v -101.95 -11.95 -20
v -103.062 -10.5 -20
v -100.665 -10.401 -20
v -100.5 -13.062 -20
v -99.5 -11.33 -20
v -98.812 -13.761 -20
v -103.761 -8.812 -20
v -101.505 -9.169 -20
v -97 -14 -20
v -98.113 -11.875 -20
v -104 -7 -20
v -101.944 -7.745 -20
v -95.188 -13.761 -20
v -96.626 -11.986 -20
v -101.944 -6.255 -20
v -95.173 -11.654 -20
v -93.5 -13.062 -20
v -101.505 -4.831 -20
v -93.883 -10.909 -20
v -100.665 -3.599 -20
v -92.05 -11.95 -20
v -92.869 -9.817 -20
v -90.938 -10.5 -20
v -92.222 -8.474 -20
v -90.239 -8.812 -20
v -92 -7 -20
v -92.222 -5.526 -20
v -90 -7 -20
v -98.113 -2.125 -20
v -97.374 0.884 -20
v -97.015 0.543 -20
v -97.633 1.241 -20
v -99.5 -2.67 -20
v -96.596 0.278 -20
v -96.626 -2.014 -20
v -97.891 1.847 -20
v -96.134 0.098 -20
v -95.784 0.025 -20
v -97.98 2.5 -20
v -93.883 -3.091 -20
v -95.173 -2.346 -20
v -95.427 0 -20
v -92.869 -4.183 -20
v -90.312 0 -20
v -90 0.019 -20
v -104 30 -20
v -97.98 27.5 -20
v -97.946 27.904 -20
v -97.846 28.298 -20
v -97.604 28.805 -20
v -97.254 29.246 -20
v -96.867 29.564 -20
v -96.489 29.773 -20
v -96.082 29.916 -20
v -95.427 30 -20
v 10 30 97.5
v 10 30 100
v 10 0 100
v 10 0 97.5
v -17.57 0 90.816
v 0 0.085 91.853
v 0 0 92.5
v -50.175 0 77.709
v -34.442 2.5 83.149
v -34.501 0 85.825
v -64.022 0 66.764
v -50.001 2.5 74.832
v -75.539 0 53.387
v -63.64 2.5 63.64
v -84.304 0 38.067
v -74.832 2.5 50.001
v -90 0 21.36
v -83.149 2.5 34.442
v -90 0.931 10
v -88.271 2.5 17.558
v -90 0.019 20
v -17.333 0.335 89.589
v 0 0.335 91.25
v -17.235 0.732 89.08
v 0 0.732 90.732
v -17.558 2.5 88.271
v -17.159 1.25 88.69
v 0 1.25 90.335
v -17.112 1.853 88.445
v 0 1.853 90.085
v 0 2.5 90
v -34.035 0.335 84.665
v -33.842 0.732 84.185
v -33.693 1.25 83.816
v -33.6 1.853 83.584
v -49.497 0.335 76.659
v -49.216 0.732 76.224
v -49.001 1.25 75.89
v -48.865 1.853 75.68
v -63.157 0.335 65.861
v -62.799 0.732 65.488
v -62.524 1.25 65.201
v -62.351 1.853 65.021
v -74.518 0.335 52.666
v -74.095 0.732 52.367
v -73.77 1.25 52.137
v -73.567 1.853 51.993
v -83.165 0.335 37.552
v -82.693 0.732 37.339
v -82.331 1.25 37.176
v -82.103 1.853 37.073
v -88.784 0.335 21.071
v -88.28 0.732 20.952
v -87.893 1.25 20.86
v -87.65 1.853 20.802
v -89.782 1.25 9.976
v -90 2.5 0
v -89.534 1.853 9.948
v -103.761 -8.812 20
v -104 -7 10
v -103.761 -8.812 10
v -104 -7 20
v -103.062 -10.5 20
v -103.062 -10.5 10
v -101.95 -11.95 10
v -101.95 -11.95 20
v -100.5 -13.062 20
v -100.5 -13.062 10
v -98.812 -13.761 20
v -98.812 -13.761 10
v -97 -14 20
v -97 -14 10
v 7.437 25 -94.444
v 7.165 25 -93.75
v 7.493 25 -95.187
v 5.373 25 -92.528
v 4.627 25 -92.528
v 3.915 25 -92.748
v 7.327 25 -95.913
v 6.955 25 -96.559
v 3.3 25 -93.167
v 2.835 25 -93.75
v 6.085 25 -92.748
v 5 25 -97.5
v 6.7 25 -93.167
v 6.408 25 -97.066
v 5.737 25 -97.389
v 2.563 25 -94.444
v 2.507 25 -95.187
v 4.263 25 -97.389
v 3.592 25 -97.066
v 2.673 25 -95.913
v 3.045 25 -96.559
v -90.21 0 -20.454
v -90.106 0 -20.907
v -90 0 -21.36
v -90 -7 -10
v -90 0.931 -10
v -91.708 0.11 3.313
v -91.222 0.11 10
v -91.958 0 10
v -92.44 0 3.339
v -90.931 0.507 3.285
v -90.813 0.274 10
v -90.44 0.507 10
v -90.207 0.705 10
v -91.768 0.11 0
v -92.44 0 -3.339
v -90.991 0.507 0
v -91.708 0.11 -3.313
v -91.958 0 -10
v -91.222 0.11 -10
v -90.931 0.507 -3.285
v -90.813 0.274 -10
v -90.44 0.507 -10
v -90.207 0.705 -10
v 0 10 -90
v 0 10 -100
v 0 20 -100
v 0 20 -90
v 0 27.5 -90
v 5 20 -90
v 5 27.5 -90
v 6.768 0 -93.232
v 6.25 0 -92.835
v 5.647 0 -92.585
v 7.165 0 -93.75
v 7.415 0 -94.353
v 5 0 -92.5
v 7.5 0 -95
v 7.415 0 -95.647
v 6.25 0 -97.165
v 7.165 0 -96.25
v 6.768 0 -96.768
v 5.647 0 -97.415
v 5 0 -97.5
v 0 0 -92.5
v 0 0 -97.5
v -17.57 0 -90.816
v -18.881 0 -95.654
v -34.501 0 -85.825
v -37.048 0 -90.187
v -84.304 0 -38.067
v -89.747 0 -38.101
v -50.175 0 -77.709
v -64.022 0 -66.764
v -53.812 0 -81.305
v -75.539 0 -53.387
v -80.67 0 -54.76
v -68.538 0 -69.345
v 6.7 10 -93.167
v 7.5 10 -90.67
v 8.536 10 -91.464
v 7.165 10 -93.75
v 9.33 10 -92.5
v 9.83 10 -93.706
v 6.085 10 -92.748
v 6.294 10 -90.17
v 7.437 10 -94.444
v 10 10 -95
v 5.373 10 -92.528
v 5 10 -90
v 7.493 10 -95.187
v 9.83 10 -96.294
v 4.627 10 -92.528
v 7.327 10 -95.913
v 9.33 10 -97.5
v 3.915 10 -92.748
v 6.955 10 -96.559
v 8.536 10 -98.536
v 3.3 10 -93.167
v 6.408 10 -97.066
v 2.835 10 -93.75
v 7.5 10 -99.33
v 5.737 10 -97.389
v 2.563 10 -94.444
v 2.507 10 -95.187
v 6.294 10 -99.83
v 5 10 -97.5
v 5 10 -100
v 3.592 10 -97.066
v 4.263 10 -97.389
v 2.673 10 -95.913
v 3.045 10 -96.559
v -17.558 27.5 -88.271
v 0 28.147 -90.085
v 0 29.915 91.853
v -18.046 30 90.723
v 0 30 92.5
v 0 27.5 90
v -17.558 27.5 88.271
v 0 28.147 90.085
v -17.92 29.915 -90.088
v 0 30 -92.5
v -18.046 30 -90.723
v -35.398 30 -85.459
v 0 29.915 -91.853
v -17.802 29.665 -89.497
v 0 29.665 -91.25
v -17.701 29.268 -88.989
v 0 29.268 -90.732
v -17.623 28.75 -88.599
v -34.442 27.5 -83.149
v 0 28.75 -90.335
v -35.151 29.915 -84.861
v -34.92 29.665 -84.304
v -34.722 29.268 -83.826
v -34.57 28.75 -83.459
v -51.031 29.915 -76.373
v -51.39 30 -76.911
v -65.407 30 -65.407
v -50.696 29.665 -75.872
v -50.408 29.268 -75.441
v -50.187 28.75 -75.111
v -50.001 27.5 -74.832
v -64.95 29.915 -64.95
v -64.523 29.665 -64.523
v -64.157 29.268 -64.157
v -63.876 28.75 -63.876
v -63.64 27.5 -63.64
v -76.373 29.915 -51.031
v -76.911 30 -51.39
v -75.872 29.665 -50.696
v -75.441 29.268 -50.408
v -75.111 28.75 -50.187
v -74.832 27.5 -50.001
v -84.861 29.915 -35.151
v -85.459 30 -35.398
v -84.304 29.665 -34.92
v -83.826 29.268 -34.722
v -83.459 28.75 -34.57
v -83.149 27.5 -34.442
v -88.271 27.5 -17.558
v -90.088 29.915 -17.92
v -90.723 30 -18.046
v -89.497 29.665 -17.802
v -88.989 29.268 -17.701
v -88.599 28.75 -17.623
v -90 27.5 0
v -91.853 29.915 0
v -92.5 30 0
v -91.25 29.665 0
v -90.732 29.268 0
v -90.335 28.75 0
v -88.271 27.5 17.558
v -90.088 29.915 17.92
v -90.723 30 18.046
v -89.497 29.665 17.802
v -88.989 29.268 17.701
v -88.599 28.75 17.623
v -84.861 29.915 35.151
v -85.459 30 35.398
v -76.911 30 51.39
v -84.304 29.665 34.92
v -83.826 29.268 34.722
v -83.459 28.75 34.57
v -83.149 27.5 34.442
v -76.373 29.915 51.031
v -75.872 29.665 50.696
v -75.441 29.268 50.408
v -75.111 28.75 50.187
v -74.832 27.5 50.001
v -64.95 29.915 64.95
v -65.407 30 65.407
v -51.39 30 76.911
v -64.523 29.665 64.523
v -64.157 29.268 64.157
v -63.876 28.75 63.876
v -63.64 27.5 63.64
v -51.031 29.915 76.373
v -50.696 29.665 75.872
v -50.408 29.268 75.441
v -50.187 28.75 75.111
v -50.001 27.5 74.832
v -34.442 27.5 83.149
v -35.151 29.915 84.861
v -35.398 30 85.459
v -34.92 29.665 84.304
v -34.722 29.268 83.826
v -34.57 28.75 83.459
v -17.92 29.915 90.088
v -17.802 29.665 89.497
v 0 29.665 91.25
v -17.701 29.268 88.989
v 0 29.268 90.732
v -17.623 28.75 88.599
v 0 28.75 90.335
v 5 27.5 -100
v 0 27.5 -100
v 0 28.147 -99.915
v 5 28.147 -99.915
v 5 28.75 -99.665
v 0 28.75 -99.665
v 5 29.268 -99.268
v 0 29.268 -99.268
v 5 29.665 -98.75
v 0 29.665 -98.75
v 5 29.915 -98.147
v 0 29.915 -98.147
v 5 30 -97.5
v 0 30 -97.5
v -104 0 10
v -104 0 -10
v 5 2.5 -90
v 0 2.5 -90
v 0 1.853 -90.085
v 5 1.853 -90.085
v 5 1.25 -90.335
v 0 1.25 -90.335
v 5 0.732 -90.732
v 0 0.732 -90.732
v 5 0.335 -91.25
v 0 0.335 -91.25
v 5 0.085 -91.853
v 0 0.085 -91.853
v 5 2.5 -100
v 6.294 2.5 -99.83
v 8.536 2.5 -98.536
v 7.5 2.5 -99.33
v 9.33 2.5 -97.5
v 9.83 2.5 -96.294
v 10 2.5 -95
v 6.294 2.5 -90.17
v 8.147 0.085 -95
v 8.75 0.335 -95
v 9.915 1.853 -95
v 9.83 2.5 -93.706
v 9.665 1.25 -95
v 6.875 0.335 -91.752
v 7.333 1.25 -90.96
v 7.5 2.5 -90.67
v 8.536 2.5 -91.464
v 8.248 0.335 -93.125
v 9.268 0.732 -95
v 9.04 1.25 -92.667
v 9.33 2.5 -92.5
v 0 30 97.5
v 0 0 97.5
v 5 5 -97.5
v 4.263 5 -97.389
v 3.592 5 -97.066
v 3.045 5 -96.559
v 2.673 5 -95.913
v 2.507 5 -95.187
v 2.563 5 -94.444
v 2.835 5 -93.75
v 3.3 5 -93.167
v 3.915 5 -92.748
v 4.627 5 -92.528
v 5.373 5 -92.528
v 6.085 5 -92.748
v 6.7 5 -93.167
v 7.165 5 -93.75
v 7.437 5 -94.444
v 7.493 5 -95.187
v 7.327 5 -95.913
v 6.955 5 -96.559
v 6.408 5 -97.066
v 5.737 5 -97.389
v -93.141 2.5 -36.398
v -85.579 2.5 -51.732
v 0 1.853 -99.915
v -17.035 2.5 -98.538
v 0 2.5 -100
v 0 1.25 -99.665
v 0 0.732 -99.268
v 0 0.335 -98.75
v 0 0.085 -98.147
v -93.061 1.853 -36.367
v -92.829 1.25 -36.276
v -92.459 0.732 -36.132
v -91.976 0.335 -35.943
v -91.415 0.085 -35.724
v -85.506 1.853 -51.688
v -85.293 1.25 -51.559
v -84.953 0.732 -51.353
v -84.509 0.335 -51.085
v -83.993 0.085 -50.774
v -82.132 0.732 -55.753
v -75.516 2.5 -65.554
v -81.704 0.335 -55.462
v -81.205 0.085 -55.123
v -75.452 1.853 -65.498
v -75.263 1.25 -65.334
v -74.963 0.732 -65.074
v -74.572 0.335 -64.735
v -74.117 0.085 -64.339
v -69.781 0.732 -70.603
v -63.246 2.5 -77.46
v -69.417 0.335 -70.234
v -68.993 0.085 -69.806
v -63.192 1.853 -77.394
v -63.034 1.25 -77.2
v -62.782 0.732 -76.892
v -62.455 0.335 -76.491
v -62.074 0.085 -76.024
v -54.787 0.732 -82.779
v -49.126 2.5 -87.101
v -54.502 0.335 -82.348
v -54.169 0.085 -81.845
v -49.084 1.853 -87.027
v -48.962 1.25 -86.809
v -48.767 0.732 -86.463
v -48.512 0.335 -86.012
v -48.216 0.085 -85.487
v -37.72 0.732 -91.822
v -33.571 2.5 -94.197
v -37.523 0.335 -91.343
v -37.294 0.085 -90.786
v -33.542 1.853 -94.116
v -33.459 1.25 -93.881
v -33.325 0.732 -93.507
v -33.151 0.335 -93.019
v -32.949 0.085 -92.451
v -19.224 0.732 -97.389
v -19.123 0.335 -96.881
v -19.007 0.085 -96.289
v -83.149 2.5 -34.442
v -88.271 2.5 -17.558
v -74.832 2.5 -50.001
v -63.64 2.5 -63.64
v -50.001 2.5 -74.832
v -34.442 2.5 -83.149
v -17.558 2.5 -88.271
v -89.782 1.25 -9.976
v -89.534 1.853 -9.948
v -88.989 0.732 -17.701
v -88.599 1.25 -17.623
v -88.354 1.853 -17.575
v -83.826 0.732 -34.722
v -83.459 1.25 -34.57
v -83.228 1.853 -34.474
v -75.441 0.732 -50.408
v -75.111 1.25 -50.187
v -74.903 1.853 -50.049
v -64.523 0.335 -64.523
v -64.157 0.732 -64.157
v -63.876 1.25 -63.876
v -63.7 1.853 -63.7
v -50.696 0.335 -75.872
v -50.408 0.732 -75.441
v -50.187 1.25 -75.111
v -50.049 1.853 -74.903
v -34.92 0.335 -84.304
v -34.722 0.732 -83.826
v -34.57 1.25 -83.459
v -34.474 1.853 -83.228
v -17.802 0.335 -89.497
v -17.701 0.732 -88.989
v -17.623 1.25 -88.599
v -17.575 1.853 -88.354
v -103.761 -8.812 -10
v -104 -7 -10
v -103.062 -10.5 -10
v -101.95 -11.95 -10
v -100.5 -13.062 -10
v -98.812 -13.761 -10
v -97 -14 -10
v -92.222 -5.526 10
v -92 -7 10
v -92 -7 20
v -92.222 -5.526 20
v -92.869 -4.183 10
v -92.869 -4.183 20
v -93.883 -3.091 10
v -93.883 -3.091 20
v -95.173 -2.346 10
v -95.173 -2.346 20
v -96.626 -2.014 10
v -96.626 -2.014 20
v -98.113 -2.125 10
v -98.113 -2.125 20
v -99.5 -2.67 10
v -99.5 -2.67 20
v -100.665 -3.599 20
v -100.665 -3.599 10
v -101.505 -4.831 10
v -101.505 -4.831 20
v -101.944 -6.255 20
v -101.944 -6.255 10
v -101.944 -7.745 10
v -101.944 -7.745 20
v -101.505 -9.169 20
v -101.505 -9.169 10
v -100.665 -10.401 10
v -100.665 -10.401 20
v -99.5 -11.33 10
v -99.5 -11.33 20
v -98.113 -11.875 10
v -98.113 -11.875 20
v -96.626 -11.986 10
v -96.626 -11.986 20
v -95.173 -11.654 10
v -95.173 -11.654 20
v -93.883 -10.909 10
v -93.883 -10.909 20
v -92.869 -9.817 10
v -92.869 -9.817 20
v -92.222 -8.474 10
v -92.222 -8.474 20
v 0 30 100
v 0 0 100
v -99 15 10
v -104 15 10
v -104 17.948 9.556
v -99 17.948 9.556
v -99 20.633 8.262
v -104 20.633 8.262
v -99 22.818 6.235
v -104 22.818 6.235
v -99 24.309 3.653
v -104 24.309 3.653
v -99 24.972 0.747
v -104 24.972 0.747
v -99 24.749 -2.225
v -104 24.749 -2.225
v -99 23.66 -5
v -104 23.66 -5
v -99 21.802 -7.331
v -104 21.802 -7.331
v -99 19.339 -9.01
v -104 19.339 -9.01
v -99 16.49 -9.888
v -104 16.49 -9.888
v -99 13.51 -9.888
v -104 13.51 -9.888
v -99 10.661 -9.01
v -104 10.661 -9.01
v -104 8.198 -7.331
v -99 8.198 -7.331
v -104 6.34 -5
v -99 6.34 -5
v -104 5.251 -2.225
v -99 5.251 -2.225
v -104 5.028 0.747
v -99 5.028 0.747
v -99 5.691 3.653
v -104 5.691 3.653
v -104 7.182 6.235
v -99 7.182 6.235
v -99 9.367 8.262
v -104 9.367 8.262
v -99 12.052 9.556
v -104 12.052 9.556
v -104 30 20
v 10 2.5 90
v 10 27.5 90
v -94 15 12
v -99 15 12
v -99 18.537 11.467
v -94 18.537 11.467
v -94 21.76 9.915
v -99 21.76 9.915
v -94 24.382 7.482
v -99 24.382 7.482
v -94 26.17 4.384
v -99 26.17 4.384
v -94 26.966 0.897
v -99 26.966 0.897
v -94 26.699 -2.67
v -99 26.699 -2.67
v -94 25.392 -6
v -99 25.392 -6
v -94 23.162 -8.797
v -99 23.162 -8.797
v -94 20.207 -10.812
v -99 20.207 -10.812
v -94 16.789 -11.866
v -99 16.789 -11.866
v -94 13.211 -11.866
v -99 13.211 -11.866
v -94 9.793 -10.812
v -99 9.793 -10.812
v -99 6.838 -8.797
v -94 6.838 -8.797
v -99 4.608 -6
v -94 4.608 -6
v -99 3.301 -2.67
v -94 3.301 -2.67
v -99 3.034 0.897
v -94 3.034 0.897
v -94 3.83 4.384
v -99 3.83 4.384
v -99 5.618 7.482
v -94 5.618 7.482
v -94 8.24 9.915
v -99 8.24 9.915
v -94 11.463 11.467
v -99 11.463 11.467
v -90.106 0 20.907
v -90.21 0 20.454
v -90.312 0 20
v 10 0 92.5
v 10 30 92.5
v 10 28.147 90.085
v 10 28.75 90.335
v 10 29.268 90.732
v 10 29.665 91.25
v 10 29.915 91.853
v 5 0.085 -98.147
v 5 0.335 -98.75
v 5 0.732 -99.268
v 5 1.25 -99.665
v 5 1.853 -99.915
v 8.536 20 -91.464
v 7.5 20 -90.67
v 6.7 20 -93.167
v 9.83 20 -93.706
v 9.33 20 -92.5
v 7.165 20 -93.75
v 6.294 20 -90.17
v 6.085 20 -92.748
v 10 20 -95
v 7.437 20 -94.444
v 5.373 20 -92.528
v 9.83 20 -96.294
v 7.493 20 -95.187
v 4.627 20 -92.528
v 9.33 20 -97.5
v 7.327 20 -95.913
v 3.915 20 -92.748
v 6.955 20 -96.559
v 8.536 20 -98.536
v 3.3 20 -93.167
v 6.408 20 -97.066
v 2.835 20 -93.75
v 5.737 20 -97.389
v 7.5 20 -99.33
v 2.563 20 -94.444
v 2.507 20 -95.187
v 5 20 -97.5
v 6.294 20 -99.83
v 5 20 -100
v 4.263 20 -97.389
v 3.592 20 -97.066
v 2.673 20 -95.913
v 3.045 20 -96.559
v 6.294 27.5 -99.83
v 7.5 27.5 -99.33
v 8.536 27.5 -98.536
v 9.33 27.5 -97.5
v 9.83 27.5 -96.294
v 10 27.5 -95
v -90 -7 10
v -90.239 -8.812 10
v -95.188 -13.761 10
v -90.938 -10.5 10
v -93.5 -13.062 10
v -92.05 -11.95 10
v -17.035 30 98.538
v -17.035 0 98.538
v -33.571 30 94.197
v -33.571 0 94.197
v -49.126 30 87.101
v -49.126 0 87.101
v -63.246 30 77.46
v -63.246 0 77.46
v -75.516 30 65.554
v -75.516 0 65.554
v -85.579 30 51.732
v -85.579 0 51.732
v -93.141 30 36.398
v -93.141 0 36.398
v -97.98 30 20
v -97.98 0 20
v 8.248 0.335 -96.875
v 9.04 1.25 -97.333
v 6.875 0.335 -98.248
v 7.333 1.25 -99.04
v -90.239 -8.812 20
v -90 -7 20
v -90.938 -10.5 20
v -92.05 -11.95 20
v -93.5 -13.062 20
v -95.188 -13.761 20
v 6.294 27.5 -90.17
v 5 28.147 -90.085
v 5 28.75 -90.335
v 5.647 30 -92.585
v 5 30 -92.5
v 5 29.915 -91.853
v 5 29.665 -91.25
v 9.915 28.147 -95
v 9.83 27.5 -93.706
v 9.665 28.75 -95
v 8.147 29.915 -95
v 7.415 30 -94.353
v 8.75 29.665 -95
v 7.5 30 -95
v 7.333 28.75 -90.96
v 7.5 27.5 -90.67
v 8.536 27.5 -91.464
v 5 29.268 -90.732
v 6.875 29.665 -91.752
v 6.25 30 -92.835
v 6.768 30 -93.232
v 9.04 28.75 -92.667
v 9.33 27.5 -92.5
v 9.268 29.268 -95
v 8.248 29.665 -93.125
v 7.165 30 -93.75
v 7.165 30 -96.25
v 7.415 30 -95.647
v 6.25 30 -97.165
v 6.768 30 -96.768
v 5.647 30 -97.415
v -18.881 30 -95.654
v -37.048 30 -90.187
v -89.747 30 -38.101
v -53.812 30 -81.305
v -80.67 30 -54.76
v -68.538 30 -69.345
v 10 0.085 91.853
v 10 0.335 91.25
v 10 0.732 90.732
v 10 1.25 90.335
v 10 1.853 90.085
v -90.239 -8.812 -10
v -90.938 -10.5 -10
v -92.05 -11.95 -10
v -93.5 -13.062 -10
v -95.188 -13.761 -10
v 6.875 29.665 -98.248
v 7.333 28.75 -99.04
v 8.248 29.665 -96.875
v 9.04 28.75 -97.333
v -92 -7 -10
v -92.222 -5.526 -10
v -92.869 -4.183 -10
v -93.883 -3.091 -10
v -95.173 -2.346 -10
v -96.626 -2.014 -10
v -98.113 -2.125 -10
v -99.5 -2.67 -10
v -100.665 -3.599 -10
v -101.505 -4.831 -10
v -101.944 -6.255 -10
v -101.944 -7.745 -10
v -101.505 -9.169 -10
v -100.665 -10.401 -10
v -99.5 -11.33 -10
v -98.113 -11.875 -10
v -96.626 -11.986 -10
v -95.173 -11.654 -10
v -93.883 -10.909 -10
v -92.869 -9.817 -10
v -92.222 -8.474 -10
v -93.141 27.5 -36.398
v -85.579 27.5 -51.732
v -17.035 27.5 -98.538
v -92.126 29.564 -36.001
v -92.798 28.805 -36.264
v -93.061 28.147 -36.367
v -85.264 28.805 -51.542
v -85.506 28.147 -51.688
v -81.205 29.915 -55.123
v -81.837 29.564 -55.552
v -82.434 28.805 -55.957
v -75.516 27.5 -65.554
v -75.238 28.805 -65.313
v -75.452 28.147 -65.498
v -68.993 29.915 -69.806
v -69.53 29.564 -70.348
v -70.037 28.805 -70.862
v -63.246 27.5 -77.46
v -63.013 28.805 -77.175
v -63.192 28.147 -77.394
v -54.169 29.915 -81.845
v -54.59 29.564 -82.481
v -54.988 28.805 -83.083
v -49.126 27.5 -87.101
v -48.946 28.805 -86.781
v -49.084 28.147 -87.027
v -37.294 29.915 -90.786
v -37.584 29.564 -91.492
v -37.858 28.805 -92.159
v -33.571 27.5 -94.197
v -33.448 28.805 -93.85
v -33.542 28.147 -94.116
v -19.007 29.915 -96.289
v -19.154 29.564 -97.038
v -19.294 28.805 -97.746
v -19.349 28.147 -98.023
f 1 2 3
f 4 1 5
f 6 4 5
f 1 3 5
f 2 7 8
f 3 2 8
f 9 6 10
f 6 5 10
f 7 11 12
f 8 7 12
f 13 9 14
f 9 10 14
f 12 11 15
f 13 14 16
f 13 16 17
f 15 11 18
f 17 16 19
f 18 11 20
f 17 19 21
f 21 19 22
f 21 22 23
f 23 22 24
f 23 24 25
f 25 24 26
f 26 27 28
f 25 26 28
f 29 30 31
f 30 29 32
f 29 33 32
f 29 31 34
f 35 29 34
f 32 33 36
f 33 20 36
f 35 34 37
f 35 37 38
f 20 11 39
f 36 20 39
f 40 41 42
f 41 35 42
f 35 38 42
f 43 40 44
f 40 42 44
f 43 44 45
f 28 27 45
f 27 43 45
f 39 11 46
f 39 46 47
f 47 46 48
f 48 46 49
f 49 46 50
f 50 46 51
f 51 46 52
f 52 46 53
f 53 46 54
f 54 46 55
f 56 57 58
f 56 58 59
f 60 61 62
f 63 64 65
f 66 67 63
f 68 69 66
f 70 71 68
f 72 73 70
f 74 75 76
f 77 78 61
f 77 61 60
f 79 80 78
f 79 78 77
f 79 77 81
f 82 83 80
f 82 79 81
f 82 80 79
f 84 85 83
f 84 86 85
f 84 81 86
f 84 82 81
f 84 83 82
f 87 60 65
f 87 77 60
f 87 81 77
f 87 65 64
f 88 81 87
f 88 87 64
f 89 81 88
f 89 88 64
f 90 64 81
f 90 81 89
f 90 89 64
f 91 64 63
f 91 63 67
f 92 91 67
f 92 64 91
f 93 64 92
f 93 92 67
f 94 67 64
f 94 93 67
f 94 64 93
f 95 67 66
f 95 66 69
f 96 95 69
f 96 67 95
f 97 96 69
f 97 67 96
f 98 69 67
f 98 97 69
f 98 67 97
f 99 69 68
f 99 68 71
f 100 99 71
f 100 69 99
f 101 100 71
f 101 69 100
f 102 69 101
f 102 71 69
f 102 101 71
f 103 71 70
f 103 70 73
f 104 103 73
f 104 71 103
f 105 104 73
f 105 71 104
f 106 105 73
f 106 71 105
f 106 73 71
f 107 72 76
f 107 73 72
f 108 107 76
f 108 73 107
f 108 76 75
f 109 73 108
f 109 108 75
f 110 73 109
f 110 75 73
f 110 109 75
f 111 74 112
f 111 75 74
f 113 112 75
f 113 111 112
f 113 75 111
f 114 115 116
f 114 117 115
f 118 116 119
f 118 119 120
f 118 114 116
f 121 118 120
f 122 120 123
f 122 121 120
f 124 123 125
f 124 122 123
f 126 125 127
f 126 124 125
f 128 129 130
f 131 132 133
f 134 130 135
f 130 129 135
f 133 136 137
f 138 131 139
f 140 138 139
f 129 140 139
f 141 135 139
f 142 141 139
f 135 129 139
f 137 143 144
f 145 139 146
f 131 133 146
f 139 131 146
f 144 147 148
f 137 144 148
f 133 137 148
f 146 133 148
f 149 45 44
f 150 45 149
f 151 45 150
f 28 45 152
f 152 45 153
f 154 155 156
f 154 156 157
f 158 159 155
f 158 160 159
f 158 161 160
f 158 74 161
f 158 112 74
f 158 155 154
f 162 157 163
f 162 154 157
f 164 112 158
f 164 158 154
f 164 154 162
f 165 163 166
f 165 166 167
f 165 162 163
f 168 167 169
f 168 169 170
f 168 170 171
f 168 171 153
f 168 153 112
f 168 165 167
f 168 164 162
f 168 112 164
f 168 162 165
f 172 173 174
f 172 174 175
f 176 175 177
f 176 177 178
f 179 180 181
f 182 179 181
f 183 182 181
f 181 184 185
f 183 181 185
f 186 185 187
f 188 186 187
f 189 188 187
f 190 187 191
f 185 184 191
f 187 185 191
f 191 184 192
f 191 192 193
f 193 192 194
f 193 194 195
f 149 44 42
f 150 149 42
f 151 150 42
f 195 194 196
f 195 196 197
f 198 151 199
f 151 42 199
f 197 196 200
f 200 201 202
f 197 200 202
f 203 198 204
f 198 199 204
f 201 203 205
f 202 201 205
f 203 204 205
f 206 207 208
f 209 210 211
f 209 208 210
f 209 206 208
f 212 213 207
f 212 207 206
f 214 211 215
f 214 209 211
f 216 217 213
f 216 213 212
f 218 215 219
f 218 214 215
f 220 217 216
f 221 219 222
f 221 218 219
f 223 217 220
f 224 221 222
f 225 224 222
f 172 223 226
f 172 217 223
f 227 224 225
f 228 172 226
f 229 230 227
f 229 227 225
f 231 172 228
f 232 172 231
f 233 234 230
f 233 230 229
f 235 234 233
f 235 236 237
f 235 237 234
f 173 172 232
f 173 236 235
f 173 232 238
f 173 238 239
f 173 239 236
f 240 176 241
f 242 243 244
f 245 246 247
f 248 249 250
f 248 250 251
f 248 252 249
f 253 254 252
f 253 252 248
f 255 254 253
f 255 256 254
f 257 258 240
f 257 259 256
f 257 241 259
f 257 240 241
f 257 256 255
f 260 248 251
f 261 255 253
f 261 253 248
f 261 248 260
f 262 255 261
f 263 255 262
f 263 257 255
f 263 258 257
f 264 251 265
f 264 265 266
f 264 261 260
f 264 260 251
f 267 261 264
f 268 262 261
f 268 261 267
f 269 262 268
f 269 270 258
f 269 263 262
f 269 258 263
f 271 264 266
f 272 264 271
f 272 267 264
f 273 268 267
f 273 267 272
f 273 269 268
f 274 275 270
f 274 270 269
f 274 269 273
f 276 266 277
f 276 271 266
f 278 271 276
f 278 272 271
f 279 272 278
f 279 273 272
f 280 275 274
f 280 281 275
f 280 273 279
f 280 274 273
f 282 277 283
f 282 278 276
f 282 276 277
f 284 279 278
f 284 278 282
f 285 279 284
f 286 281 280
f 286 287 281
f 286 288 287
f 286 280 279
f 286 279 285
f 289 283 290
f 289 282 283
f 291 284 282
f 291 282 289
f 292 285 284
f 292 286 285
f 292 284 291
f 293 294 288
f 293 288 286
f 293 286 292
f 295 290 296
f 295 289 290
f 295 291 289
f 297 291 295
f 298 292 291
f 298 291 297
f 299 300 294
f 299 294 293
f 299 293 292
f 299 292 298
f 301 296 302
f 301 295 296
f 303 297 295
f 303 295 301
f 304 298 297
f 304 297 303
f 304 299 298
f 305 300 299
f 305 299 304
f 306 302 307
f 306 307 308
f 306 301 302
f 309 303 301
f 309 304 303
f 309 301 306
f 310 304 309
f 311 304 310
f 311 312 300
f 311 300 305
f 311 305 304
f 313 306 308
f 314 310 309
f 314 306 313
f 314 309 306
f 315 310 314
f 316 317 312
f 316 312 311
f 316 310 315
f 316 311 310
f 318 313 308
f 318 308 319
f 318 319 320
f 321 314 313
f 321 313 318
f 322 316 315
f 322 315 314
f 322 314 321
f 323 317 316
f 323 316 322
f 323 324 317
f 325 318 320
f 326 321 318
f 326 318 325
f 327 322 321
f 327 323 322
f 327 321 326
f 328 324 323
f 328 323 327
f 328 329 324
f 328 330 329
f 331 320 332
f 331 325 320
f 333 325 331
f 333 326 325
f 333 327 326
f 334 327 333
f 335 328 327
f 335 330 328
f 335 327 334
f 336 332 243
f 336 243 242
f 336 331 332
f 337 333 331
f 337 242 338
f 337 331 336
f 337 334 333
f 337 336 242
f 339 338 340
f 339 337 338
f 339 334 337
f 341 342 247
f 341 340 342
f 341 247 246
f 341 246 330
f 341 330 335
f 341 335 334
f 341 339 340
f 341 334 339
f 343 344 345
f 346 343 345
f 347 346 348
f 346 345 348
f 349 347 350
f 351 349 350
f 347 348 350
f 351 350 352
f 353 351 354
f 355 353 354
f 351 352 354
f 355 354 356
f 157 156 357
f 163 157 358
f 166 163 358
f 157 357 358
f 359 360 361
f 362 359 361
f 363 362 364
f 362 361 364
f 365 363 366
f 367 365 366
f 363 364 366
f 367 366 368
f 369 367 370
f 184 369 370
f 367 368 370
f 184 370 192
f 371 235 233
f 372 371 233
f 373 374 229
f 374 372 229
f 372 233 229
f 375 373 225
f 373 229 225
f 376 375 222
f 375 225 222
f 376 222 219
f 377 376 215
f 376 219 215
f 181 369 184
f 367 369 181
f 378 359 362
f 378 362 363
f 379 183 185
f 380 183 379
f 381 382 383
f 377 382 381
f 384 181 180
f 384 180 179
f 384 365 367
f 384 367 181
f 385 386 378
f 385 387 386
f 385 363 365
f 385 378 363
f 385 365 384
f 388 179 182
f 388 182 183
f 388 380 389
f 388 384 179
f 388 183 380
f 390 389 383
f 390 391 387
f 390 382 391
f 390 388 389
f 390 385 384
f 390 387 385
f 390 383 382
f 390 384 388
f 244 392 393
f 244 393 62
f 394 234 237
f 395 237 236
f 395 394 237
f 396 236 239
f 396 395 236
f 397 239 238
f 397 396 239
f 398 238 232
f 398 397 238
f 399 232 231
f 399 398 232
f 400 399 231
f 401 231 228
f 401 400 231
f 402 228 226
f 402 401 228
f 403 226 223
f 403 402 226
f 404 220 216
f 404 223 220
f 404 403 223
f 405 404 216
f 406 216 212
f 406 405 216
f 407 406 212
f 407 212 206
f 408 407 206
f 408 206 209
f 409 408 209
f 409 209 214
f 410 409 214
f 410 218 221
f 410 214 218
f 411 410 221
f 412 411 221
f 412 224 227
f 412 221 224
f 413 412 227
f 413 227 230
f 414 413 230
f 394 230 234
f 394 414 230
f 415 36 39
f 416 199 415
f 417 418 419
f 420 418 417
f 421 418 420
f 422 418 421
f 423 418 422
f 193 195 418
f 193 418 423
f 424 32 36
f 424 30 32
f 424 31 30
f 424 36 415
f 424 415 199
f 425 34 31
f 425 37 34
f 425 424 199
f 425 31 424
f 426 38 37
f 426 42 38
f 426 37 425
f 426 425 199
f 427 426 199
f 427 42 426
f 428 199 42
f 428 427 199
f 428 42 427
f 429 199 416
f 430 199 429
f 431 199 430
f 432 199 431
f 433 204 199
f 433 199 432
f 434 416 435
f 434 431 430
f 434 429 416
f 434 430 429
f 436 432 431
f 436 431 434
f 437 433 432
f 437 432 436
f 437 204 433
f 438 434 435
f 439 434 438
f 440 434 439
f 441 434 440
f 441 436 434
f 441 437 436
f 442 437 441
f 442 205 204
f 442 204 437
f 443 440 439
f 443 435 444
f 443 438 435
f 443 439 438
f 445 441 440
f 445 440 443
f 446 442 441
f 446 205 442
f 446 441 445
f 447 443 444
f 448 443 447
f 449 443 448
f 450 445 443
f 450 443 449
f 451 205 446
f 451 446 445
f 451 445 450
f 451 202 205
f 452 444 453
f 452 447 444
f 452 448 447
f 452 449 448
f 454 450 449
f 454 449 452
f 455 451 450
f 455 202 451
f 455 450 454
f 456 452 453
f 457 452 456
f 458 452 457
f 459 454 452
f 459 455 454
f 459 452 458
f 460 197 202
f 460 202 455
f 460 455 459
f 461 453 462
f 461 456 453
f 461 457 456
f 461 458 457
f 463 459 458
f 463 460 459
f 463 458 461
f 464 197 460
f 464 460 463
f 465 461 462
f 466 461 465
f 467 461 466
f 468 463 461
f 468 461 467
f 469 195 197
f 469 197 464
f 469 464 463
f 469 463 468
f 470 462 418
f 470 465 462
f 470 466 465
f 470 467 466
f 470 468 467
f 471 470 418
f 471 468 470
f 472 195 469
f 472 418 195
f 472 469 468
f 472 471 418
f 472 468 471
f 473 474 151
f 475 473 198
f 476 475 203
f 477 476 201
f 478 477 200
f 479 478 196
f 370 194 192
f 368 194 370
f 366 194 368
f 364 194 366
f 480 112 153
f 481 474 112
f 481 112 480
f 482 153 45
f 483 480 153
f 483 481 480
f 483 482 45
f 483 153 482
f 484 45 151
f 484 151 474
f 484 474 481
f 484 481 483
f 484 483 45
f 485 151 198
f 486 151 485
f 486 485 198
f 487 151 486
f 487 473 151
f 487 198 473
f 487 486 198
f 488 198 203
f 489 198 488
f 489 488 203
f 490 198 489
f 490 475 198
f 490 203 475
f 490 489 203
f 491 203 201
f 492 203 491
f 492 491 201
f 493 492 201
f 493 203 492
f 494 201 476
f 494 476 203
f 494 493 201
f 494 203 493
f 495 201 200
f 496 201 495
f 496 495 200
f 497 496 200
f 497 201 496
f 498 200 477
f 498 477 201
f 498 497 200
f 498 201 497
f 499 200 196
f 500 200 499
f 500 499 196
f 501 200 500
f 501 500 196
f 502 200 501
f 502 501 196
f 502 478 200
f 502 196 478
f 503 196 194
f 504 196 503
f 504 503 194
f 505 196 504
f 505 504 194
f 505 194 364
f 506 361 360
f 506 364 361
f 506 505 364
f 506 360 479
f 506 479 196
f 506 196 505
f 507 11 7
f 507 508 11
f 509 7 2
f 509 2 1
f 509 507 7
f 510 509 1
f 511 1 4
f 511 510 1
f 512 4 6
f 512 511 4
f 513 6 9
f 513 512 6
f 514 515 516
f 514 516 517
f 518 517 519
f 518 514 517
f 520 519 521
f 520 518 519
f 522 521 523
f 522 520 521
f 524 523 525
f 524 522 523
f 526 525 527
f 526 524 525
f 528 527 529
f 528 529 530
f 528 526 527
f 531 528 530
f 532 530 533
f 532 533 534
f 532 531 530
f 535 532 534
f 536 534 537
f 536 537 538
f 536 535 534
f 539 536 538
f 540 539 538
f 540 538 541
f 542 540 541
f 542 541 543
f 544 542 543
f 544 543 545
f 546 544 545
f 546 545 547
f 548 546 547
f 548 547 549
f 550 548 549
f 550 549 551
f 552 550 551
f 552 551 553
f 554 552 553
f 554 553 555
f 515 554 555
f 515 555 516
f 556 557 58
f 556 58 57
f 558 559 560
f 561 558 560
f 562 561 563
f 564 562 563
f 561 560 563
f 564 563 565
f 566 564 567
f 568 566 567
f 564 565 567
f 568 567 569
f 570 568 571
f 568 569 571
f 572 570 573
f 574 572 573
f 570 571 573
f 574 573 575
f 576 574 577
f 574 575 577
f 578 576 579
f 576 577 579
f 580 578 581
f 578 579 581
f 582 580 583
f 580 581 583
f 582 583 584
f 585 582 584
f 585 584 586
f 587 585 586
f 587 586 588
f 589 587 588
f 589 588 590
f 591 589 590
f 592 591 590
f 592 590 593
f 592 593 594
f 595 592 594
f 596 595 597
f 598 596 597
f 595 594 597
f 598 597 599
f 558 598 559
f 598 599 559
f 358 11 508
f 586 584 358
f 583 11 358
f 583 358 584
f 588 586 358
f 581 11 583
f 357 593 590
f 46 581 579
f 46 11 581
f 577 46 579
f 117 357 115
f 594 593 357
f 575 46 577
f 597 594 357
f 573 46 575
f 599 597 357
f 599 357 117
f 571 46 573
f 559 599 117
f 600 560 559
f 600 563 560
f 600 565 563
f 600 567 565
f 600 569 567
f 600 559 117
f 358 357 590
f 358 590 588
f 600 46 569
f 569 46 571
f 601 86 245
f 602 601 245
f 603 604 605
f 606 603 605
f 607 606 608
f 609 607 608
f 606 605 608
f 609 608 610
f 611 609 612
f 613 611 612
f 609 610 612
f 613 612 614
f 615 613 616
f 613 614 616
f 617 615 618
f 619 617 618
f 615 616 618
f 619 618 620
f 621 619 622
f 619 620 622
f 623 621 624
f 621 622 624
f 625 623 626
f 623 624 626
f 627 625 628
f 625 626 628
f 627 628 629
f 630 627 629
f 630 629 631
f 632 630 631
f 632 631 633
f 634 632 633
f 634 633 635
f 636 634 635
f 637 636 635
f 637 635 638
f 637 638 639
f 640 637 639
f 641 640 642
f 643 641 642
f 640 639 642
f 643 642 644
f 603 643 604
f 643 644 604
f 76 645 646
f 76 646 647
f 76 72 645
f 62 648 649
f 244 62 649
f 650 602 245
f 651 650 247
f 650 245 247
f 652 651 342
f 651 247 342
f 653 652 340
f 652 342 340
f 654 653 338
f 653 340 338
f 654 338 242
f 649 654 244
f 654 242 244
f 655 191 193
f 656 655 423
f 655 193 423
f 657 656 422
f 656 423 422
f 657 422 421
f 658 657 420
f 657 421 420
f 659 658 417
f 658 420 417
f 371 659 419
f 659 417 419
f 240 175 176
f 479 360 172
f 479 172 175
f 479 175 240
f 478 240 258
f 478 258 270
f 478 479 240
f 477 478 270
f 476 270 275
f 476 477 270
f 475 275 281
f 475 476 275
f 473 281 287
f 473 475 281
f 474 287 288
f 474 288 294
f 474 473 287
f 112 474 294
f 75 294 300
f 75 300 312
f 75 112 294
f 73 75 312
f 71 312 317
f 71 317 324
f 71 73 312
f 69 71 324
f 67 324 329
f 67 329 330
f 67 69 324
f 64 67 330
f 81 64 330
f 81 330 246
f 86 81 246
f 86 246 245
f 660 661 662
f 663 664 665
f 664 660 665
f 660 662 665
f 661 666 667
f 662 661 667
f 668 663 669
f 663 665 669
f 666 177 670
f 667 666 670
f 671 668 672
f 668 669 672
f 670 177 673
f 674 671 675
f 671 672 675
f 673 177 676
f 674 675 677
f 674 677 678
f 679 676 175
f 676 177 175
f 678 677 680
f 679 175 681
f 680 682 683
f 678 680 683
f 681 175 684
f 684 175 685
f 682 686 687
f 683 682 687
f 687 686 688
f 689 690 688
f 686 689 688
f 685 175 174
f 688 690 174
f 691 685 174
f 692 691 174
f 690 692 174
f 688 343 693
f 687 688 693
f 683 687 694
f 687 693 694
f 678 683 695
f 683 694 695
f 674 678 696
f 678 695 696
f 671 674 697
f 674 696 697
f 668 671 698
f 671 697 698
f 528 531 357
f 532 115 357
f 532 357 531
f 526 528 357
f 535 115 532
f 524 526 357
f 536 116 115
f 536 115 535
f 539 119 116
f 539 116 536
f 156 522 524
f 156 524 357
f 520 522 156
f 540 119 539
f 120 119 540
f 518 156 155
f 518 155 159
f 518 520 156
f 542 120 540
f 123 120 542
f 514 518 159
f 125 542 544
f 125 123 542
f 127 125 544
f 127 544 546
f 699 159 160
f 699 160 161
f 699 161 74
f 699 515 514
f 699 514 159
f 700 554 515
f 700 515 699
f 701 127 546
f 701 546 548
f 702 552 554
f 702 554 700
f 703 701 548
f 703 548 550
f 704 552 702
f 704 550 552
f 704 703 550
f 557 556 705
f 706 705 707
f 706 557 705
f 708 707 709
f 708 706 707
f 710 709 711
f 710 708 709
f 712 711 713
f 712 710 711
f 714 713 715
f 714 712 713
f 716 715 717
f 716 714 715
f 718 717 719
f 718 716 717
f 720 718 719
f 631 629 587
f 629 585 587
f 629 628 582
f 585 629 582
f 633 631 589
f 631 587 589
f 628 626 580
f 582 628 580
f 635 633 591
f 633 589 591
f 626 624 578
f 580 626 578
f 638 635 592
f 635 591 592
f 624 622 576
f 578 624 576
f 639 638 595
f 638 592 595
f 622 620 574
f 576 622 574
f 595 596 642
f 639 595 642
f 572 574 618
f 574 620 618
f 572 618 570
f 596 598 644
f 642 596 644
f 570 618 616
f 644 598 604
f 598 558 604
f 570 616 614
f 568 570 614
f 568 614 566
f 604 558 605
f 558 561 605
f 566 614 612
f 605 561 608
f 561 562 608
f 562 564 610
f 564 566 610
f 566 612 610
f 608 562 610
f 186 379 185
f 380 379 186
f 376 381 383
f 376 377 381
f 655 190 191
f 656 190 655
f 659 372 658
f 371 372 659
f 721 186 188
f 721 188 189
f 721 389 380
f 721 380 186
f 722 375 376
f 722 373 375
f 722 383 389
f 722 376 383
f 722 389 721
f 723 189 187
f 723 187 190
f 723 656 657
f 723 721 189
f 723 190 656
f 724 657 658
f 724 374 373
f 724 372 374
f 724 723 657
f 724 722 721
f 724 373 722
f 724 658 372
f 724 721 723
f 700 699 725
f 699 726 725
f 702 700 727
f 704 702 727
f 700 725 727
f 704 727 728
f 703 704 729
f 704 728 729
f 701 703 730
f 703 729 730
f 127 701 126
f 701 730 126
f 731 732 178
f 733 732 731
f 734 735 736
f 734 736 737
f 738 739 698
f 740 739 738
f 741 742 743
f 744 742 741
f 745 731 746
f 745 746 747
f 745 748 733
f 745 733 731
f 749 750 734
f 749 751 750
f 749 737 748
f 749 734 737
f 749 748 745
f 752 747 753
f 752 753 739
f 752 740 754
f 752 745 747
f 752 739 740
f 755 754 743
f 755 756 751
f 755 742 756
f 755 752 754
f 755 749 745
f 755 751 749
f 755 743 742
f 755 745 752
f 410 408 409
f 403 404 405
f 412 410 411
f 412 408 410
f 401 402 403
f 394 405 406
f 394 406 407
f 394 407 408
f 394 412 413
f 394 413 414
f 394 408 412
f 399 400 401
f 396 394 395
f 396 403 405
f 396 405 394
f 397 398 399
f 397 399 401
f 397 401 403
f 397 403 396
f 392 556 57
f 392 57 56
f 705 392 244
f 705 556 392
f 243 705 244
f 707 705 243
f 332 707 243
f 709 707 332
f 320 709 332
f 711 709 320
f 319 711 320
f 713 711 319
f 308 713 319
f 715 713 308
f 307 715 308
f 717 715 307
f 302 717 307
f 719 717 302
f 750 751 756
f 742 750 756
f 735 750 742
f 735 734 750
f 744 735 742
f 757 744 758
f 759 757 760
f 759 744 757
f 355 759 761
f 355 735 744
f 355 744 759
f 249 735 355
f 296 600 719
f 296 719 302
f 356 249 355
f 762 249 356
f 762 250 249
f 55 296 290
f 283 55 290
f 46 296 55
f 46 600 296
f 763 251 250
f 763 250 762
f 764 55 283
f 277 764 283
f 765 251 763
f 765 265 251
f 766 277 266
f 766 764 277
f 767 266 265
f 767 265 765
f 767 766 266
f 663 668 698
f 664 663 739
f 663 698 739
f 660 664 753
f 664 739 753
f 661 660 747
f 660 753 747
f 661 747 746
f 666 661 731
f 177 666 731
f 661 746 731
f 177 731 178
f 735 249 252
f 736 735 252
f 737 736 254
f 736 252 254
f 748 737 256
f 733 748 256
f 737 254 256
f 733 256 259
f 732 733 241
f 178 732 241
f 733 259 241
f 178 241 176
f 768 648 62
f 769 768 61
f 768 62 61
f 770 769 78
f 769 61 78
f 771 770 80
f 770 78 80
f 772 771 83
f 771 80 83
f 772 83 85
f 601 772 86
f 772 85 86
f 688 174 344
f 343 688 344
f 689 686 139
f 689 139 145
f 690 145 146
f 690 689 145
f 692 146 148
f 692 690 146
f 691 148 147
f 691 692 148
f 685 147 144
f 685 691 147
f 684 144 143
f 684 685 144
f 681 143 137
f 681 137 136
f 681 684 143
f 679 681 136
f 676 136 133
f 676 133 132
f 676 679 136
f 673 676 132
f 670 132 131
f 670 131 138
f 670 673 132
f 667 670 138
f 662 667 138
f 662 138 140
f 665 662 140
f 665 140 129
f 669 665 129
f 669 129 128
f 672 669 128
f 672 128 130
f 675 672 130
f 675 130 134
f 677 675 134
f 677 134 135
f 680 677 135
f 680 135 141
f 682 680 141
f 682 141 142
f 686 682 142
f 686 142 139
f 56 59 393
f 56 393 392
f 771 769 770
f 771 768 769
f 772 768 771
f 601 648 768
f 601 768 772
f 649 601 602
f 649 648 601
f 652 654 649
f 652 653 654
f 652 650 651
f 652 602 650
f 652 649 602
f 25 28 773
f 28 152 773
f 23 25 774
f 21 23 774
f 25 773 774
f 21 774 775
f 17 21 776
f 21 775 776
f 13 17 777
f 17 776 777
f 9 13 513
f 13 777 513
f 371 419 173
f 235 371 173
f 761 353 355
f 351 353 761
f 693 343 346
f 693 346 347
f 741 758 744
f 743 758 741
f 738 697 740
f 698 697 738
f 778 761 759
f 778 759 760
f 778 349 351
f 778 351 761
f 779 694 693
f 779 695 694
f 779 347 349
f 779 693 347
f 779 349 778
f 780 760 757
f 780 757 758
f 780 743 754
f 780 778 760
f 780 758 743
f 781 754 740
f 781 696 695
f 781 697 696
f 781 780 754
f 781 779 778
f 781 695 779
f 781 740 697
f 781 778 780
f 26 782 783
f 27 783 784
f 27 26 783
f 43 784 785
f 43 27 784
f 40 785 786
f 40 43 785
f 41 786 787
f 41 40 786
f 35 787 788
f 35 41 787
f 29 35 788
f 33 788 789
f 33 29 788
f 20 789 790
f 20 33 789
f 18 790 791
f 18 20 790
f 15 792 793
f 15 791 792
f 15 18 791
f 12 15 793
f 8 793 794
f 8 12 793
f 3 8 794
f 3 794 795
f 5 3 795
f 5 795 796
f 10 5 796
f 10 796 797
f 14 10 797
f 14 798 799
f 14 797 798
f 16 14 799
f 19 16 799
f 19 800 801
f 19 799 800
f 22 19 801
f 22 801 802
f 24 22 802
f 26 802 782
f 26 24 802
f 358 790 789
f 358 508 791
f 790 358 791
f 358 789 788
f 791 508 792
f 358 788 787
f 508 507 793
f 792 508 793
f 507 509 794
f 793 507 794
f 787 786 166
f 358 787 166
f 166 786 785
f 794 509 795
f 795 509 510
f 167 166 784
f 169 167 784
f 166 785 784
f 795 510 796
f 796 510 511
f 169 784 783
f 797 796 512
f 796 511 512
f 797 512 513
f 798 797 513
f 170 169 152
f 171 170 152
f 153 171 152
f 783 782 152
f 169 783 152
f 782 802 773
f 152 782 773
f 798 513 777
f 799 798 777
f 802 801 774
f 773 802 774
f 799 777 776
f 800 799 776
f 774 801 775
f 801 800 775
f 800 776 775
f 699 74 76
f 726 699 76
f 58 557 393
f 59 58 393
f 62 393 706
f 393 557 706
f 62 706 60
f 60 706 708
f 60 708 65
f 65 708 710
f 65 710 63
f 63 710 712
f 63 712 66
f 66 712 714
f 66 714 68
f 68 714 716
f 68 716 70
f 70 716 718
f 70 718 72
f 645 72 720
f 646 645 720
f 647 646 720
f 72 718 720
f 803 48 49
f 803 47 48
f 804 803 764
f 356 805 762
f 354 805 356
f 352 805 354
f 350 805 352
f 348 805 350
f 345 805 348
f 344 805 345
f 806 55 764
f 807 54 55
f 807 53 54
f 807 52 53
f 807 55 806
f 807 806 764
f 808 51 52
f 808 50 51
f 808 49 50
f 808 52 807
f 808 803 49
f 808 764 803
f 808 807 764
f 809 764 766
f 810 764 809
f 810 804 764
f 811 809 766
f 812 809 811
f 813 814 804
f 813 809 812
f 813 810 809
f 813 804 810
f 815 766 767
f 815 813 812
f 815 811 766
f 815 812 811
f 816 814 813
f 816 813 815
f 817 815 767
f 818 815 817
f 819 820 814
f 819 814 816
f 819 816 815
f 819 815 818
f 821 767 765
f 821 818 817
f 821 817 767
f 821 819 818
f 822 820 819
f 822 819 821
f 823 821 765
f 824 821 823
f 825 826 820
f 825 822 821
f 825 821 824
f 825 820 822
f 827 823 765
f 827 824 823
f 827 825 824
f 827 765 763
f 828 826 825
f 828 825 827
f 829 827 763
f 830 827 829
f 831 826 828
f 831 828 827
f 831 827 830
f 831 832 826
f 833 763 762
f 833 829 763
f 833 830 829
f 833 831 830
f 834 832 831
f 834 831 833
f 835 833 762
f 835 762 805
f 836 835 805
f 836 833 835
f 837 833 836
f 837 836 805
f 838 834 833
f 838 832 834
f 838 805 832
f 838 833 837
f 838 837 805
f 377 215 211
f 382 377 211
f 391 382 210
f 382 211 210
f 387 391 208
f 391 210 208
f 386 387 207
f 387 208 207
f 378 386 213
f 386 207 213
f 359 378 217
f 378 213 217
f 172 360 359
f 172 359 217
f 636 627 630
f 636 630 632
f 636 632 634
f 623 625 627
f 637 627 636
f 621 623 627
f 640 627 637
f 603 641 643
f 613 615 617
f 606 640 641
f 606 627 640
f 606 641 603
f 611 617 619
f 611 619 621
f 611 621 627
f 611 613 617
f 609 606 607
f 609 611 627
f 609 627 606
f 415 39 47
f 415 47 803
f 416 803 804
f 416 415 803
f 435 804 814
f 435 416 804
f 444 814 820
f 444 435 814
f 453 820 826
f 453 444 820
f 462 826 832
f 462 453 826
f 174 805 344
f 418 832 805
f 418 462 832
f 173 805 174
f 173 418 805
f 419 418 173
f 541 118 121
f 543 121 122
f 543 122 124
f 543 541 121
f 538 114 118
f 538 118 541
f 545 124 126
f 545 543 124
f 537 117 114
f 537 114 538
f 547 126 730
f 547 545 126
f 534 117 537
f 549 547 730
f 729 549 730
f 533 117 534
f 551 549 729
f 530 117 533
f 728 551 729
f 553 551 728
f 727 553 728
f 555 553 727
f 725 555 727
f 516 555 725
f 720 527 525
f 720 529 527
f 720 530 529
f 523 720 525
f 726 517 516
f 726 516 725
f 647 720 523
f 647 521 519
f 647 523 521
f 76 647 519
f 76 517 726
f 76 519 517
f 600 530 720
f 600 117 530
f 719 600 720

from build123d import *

# Parameters (mm, degrees)
BOSS_EXTRUDE1_DEPTH      = 30
BOSS_EXTRUDE2_DEPTH      = 14
BOSS_EXTRUDE2_DEPTH_BACK = 30
SKETCH2_W                = 14
SKETCH2_H                = 40
SKETCH3_W                = 14
SKETCH3_H                = 20
CUT_EXTRUDE1_DEPTH       = 14
CUT_EXTRUDE2_DEPTH       = 20
CUT_EXTRUDE2_DEPTH_BACK  = 20
SKETCH5_R                = 5
SKETCH6_W                = 10
SKETCH6_H                = 10
BOSS_EXTRUDE3_DEPTH      = 10
CUT_EXTRUDE3_DEPTH       = 15
CUT_EXTRUDE3_DEPTH_BACK  = 5
SKETCH7_R                = 2.5
SKETCH8_W                = 10
SKETCH8_H                = 30
BOSS_EXTRUDE4_DEPTH      = 10
SKETCH9_W                = 5
SKETCH9_H                = 30
CUT_EXTRUDE4_DEPTH       = 10
SKETCH10_R               = 10
CUT_EXTRUDE5_DEPTH       = 5
SKETCH11_R               = 12
CUT_EXTRUDE6_DEPTH       = 5
FILLET1_R                = 7
FILLET3_R                = 5
FILLET2_R                = 2.5


# Some blends are built 0.0001 mm under size
with BuildPart() as part:
    # Sketch1 → Boss-Extrude1 (new body)
    with BuildSketch(Plane(origin=(0, 0, 0), x_dir=(1, 0, 0), z_dir=(0, 1, 0))):
        with BuildLine():
            Line((0, 100), (0, 90))
            ThreePointArc((0, 90), (-90, 0), (0, -90))
            Line((0, -90), (0, -100))
            ThreePointArc((0, -100), (-100, 0), (0, 100))
        make_face()
    extrude(amount=BOSS_EXTRUDE1_DEPTH)

    # Sketch2 → Boss-Extrude2 (add, two sides: drawn at the far end of the back side and taken through both)
    with BuildSketch(Plane.XZ.offset(-BOSS_EXTRUDE2_DEPTH_BACK)):
        with Locations((-97, 0)):
            Rectangle(SKETCH2_W, SKETCH2_H)
    extrude(amount=BOSS_EXTRUDE2_DEPTH + BOSS_EXTRUDE2_DEPTH_BACK)

    # Sketch3 → Cut-Extrude1 (cut)
    with BuildSketch(Plane.XZ.offset(14)):
        with Locations((-97, 0)):
            Rectangle(SKETCH3_W, SKETCH3_H)
    extrude(amount=-CUT_EXTRUDE1_DEPTH, mode=Mode.SUBTRACT)

    # Sketch5 → Cut-Extrude2 (cut, two sides: drawn at the far end of the back side and taken through both)
    with BuildSketch(Plane.XY.offset(-CUT_EXTRUDE2_DEPTH_BACK)):
        with Locations((-97, -7)):
            Circle(SKETCH5_R)
    extrude(amount=CUT_EXTRUDE2_DEPTH + CUT_EXTRUDE2_DEPTH_BACK, mode=Mode.SUBTRACT)

    # Sketch6 → Boss-Extrude3 (add)
    with BuildSketch(Plane(origin=(0, 0, 0), x_dir=(0, 0, -1), z_dir=(1, 0, 0))):
        with Locations((95, 25)):
            Rectangle(SKETCH6_W, SKETCH6_H)
        with Locations((95, 5)):
            Rectangle(SKETCH6_W, SKETCH6_H)
    extrude(amount=BOSS_EXTRUDE3_DEPTH)

    # Sketch7 → Cut-Extrude3 (cut, two sides: drawn at the far end of the back side and taken through both)
    with BuildSketch(Plane(origin=(0, 10, 0), x_dir=(1, 0, 0), z_dir=(0, 1, 0)).offset(-CUT_EXTRUDE3_DEPTH_BACK)):
        with Locations(Location((5, 95, 0), (0, 0, 90))):
            Circle(SKETCH7_R)
    extrude(amount=CUT_EXTRUDE3_DEPTH + CUT_EXTRUDE3_DEPTH_BACK, mode=Mode.SUBTRACT)

    # Sketch8 → Boss-Extrude4 (add)
    with BuildSketch(Plane(origin=(0, 0, 0), x_dir=(0, 0, -1), z_dir=(1, 0, 0))):
        with Locations((-95, 15)):
            Rectangle(SKETCH8_W, SKETCH8_H)
    extrude(amount=BOSS_EXTRUDE4_DEPTH)

    # Sketch9 → Cut-Extrude4 (cut)
    with BuildSketch(Plane(origin=(10, 0, 0), x_dir=(0, 0, -1), z_dir=(1, 0, 0))):
        with Locations((-95, 15)):
            Rectangle(SKETCH9_W, SKETCH9_H)
    extrude(amount=-CUT_EXTRUDE4_DEPTH, mode=Mode.SUBTRACT)

    # Sketch10 → Cut-Extrude5 (cut)
    with BuildSketch(Plane.ZY.offset(104)):
        with Locations((0, 15)):
            Circle(SKETCH10_R)
    extrude(amount=-CUT_EXTRUDE5_DEPTH, mode=Mode.SUBTRACT)

    # Sketch11 → Cut-Extrude6 (cut)
    with BuildSketch(Plane.ZY.offset(99)):
        with Locations((0, 15)):
            Circle(SKETCH11_R)
    extrude(amount=-CUT_EXTRUDE6_DEPTH, mode=Mode.SUBTRACT)

    # Fillet1
    fillet1_edges = [part.edges().sort_by_distance(p)[0] for p in [
        (-104, -14, -15),
        (-90, -14, -15),
        (-104, -14, 15),
        (-90, -14, 15),
    ]]
    fillet(fillet1_edges, radius=FILLET1_R - 0.0001)  # a hair under: the kernel refuses the full size

    # Fillet3
    fillet3_edges = [part.edges().sort_by_distance(p)[0] for p in [
        (10, 5, -90),
        (10, 5, -100),
        (10, 25, -100),
        (10, 25, -90),
    ]]
    fillet(fillet3_edges, radius=FILLET3_R - 0.0001)  # a hair under: the kernel refuses the full size

    # Fillet2
    # the kernel refuses this fillet: 2.5 mm, written as the material it takes off along each edge
    with BuildSketch(Plane(origin=(0, 0, 90), x_dir=(0, 0, 1), z_dir=(1, 0, 0)), Plane(origin=(0, 30, 90), x_dir=(0, -1, 0), z_dir=(1, 0, 0))) as fillet2_piece_1:
        with BuildLine():
            CenterArc((FILLET2_R, -FILLET2_R), FILLET2_R, 90, 90)
            Line((0, -FILLET2_R), (0, 0))
            Line((0, 0), (FILLET2_R, 0))
        make_face()
    extrude(amount=16.25, mode=Mode.SUBTRACT)
    with BuildSketch(Plane(origin=(0, 0, -90), x_dir=(0, 0, -1), z_dir=(1, 0, 0)), Plane(origin=(0, 30, -90), x_dir=(0, -1, 0), z_dir=(1, 0, 0)), Plane(origin=(0, 30, -100), x_dir=(0, 0, 1), z_dir=(1, 0, 0))) as fillet2_piece_2:
        with BuildLine():
            CenterArc((FILLET2_R, FILLET2_R), FILLET2_R, 180, 90)
            Line((0, FILLET2_R), (0, 0))
            Line((0, 0), (FILLET2_R, 0))
        make_face()
    extrude(amount=5.0001, mode=Mode.SUBTRACT)
    with BuildSketch(Plane(origin=(0, 0, 0), x_dir=(0, 0, 1), z_dir=(1, 0, 0))) as fillet2_piece_3_section:
        with BuildLine():
            CenterArc((90 + FILLET2_R, -FILLET2_R), FILLET2_R, 90, 90)
            Line((90, -FILLET2_R), (90, 0))
            Line((90, 0), (90 + FILLET2_R, 0))
        make_face()
    fillet2_piece_3 = revolve(axis=Axis((0, 0, 0), (0, -1, 0)), revolution_arc=180, mode=Mode.PRIVATE)
    fillet2_piece_3 = split(fillet2_piece_3, bisect_by=Plane(origin=(-90, 0.417646948, 90.51789801), z_dir=(1, 0, 0)), keep=Keep.TOP, mode=Mode.PRIVATE)
    add(fillet2_piece_3, mode=Mode.SUBTRACT)
    with BuildSketch(Plane(origin=(0, 0, 0), x_dir=(0, 0, 1), z_dir=(1, 0, 0))) as fillet2_piece_4_section:
        with BuildLine():
            CenterArc((90 + FILLET2_R, -FILLET2_R), FILLET2_R, 90, 90)
            Line((90, -FILLET2_R), (90, 0))
            Line((90, 0), (90 + FILLET2_R, 0))
        make_face()
    fillet2_piece_4 = revolve(axis=Axis((0, 0, 0), (0, -1, 0)), revolution_arc=180, mode=Mode.PRIVATE)
    fillet2_piece_4 = split(fillet2_piece_4, bisect_by=Plane(origin=(-90.062527527, 0.003732432, 20), z_dir=(0, 0, 1)), keep=Keep.TOP, mode=Mode.PRIVATE)
    add(fillet2_piece_4, mode=Mode.SUBTRACT)
    with BuildSketch(Plane(origin=(0, 0, 0), x_dir=(0, 0, 1), z_dir=(1, 0, 0))) as fillet2_piece_5_section:
        with BuildLine():
            CenterArc((90 + FILLET2_R, -FILLET2_R), FILLET2_R, 90, 90)
            Line((90, -FILLET2_R), (90, 0))
            Line((90, 0), (90 + FILLET2_R, 0))
        make_face()
    fillet2_piece_5 = revolve(axis=Axis((0, 0, 0), (0, -1, 0)), revolution_arc=180, mode=Mode.PRIVATE)
    fillet2_piece_5 = split(fillet2_piece_5, bisect_by=Plane(origin=(-90.540406948, 0.460795961, -10), z_dir=(0, 0, 1)), keep=Keep.TOP, mode=Mode.PRIVATE)
    fillet2_piece_5 = split(fillet2_piece_5, bisect_by=Plane(origin=(-90.540406948, 0.460795961, 10), z_dir=(0, 0, -1)), keep=Keep.TOP, mode=Mode.PRIVATE)
    add(fillet2_piece_5, mode=Mode.SUBTRACT)
    with BuildSketch(Plane(origin=(0, 0, 0), x_dir=(0, 0, 1), z_dir=(1, 0, 0))) as fillet2_piece_6_section:
        with BuildLine():
            CenterArc((90 + FILLET2_R, -FILLET2_R), FILLET2_R, 90, 90)
            Line((90, -FILLET2_R), (90, 0))
            Line((90, 0), (90 + FILLET2_R, 0))
        make_face()
    fillet2_piece_6 = revolve(axis=Axis((0, 0, 0), (0, -1, 0)), revolution_arc=180, mode=Mode.PRIVATE)
    fillet2_piece_6 = split(fillet2_piece_6, bisect_by=Plane(origin=(-90.062527448, 0.003732432, -20), z_dir=(0, 0, -1)), keep=Keep.TOP, mode=Mode.PRIVATE)
    add(fillet2_piece_6, mode=Mode.SUBTRACT)
    with BuildSketch(Plane(origin=(0, 30, 0), x_dir=(0, 0, -1), z_dir=(1, 0, 0))) as fillet2_piece_7:
        with BuildLine():
            CenterArc((90 + FILLET2_R, -FILLET2_R), FILLET2_R, 90, 90)
            Line((90 + FILLET2_R, 0), (90, 0))
            Line((90, 0), (90, -FILLET2_R))
        make_face()
    revolve(axis=Axis((0, 30, 0), (0, 1, 0)), revolution_arc=180, mode=Mode.SUBTRACT)
    with BuildSketch(Plane(origin=(0, 0, 0), x_dir=(-0.9903773605712586, 0, -0.1383932211775821), z_dir=(-0.1383932211775821, 0, 0.9903773605712586))) as fillet2_piece_8_section:
        with BuildLine():
            CenterArc((100 - FILLET2_R, -FILLET2_R), FILLET2_R, 0, 90)
            Line((100, -FILLET2_R), (100, 0))
            Line((100, 0), (100 - FILLET2_R, 0))
        make_face()
    fillet2_piece_8 = revolve(axis=Axis((0, 0, 0), (0, -1, 0)), revolution_arc=82.045120461, mode=Mode.PRIVATE)
    fillet2_piece_8 = split(fillet2_piece_8, bisect_by=Plane(origin=(-62.807815321, 0.692124363, -20), z_dir=(0, 0, -1)), keep=Keep.TOP, mode=Mode.PRIVATE)
    add(fillet2_piece_8, mode=Mode.SUBTRACT)
    with BuildSketch(Plane(origin=(0, 0, -100), x_dir=(0, 0, 1), z_dir=(1, 0, 0))) as fillet2_piece_9:
        with BuildLine():
            CenterArc((FILLET2_R, -FILLET2_R), FILLET2_R, 90, 90)
            Line((0, -FILLET2_R), (0, 0))
            Line((0, 0), (FILLET2_R, 0))
        make_face()
    extrude(amount=5.0001, mode=Mode.SUBTRACT)
    with BuildSketch(Plane(origin=(5.0001, 0, -95.0001), x_dir=(1, 0, 0), z_dir=(0, 0, 1))) as fillet2_piece_10:
        with BuildLine():
            CenterArc((4.9999 - FILLET2_R, FILLET2_R), FILLET2_R, 270, 90)
            Line((4.9999, FILLET2_R), (4.9999, 0))
            Line((4.9999, 0), (4.9999 - FILLET2_R, 0))
        make_face()
    revolve(axis=Axis((5.0001, 0, -95.0001), (0, 1, 0)), revolution_arc=90, mode=Mode.SUBTRACT)
    with BuildSketch(Plane(origin=(5.0001, 0, -94.9999), x_dir=(0, 0, 1), z_dir=(-1, 0, 0))) as fillet2_piece_11:
        with BuildLine():
            CenterArc((4.9999 - FILLET2_R, FILLET2_R), FILLET2_R, 270, 90)
            Line((4.9999, FILLET2_R), (4.9999, 0))
            Line((4.9999, 0), (4.9999 - FILLET2_R, 0))
        make_face()
    revolve(axis=Axis((5.0001, 0, -94.9999), (0, 1, 0)), revolution_arc=90, mode=Mode.SUBTRACT)
    with BuildSketch(Plane(origin=(0, 30, 0), x_dir=(-0.9903773605712582, 0, -0.13839322117758568), z_dir=(-0.13839322117758568, 0, 0.9903773605712582))) as fillet2_piece_12_section:
        with BuildLine():
            CenterArc((100 - FILLET2_R, FILLET2_R), FILLET2_R, 270, 90)
            Line((100 - FILLET2_R, 0), (100, 0))
            Line((100, 0), (100, FILLET2_R))
        make_face()
    fillet2_piece_12 = revolve(axis=Axis((0, 30, 0), (0, -1, 0)), revolution_arc=82.045120461, mode=Mode.PRIVATE)
    fillet2_piece_12 = split(fillet2_piece_12, bisect_by=Plane(origin=(-62.807815321, 29.307875637, -20), z_dir=(0, 0, -1)), keep=Keep.TOP, mode=Mode.PRIVATE)
    add(fillet2_piece_12, mode=Mode.SUBTRACT)
    with BuildSketch(Plane(origin=(5.0001, 30, -95.0001), x_dir=(0, 0, -1), z_dir=(-1, 0, 0))) as fillet2_piece_13:
        with BuildLine():
            CenterArc((4.9999 - FILLET2_R, FILLET2_R), FILLET2_R, 270, 90)
            Line((4.9999, FILLET2_R), (4.9999, 0))
            Line((4.9999, 0), (4.9999 - FILLET2_R, 0))
        make_face()
    revolve(axis=Axis((5.0001, 30, -95.0001), (0, -1, 0)), revolution_arc=90, mode=Mode.SUBTRACT)
    with BuildSketch(Plane(origin=(5.0001, 30, -94.9999), x_dir=(0, 0, 1), z_dir=(-1, 0, 0))) as fillet2_piece_14:
        with BuildLine():
            CenterArc((4.9999 - FILLET2_R, -FILLET2_R), FILLET2_R, 0, 90)
            Line((4.9999, -FILLET2_R), (4.9999, 0))
            Line((4.9999, 0), (4.9999 - FILLET2_R, 0))
        make_face()
    revolve(axis=Axis((5.0001, 30, -94.9999), (0, 1, 0)), revolution_arc=90, mode=Mode.SUBTRACT)
    with BuildSketch(Plane(origin=(10, 30, -94.9999), x_dir=(-1, 0, 0), z_dir=(0, 0, -1)), Plane(origin=(10, 0, -95.0001), x_dir=(-1, 0, 0), z_dir=(0, 0, 1))) as fillet2_piece_15:
        with BuildLine():
            CenterArc((FILLET2_R, -FILLET2_R), FILLET2_R, 90, 90)
            Line((0, -FILLET2_R), (0, 0))
            Line((0, 0), (FILLET2_R, 0))
        make_face()
    extrude(amount=0.0002, mode=Mode.SUBTRACT)


solid = part.part
